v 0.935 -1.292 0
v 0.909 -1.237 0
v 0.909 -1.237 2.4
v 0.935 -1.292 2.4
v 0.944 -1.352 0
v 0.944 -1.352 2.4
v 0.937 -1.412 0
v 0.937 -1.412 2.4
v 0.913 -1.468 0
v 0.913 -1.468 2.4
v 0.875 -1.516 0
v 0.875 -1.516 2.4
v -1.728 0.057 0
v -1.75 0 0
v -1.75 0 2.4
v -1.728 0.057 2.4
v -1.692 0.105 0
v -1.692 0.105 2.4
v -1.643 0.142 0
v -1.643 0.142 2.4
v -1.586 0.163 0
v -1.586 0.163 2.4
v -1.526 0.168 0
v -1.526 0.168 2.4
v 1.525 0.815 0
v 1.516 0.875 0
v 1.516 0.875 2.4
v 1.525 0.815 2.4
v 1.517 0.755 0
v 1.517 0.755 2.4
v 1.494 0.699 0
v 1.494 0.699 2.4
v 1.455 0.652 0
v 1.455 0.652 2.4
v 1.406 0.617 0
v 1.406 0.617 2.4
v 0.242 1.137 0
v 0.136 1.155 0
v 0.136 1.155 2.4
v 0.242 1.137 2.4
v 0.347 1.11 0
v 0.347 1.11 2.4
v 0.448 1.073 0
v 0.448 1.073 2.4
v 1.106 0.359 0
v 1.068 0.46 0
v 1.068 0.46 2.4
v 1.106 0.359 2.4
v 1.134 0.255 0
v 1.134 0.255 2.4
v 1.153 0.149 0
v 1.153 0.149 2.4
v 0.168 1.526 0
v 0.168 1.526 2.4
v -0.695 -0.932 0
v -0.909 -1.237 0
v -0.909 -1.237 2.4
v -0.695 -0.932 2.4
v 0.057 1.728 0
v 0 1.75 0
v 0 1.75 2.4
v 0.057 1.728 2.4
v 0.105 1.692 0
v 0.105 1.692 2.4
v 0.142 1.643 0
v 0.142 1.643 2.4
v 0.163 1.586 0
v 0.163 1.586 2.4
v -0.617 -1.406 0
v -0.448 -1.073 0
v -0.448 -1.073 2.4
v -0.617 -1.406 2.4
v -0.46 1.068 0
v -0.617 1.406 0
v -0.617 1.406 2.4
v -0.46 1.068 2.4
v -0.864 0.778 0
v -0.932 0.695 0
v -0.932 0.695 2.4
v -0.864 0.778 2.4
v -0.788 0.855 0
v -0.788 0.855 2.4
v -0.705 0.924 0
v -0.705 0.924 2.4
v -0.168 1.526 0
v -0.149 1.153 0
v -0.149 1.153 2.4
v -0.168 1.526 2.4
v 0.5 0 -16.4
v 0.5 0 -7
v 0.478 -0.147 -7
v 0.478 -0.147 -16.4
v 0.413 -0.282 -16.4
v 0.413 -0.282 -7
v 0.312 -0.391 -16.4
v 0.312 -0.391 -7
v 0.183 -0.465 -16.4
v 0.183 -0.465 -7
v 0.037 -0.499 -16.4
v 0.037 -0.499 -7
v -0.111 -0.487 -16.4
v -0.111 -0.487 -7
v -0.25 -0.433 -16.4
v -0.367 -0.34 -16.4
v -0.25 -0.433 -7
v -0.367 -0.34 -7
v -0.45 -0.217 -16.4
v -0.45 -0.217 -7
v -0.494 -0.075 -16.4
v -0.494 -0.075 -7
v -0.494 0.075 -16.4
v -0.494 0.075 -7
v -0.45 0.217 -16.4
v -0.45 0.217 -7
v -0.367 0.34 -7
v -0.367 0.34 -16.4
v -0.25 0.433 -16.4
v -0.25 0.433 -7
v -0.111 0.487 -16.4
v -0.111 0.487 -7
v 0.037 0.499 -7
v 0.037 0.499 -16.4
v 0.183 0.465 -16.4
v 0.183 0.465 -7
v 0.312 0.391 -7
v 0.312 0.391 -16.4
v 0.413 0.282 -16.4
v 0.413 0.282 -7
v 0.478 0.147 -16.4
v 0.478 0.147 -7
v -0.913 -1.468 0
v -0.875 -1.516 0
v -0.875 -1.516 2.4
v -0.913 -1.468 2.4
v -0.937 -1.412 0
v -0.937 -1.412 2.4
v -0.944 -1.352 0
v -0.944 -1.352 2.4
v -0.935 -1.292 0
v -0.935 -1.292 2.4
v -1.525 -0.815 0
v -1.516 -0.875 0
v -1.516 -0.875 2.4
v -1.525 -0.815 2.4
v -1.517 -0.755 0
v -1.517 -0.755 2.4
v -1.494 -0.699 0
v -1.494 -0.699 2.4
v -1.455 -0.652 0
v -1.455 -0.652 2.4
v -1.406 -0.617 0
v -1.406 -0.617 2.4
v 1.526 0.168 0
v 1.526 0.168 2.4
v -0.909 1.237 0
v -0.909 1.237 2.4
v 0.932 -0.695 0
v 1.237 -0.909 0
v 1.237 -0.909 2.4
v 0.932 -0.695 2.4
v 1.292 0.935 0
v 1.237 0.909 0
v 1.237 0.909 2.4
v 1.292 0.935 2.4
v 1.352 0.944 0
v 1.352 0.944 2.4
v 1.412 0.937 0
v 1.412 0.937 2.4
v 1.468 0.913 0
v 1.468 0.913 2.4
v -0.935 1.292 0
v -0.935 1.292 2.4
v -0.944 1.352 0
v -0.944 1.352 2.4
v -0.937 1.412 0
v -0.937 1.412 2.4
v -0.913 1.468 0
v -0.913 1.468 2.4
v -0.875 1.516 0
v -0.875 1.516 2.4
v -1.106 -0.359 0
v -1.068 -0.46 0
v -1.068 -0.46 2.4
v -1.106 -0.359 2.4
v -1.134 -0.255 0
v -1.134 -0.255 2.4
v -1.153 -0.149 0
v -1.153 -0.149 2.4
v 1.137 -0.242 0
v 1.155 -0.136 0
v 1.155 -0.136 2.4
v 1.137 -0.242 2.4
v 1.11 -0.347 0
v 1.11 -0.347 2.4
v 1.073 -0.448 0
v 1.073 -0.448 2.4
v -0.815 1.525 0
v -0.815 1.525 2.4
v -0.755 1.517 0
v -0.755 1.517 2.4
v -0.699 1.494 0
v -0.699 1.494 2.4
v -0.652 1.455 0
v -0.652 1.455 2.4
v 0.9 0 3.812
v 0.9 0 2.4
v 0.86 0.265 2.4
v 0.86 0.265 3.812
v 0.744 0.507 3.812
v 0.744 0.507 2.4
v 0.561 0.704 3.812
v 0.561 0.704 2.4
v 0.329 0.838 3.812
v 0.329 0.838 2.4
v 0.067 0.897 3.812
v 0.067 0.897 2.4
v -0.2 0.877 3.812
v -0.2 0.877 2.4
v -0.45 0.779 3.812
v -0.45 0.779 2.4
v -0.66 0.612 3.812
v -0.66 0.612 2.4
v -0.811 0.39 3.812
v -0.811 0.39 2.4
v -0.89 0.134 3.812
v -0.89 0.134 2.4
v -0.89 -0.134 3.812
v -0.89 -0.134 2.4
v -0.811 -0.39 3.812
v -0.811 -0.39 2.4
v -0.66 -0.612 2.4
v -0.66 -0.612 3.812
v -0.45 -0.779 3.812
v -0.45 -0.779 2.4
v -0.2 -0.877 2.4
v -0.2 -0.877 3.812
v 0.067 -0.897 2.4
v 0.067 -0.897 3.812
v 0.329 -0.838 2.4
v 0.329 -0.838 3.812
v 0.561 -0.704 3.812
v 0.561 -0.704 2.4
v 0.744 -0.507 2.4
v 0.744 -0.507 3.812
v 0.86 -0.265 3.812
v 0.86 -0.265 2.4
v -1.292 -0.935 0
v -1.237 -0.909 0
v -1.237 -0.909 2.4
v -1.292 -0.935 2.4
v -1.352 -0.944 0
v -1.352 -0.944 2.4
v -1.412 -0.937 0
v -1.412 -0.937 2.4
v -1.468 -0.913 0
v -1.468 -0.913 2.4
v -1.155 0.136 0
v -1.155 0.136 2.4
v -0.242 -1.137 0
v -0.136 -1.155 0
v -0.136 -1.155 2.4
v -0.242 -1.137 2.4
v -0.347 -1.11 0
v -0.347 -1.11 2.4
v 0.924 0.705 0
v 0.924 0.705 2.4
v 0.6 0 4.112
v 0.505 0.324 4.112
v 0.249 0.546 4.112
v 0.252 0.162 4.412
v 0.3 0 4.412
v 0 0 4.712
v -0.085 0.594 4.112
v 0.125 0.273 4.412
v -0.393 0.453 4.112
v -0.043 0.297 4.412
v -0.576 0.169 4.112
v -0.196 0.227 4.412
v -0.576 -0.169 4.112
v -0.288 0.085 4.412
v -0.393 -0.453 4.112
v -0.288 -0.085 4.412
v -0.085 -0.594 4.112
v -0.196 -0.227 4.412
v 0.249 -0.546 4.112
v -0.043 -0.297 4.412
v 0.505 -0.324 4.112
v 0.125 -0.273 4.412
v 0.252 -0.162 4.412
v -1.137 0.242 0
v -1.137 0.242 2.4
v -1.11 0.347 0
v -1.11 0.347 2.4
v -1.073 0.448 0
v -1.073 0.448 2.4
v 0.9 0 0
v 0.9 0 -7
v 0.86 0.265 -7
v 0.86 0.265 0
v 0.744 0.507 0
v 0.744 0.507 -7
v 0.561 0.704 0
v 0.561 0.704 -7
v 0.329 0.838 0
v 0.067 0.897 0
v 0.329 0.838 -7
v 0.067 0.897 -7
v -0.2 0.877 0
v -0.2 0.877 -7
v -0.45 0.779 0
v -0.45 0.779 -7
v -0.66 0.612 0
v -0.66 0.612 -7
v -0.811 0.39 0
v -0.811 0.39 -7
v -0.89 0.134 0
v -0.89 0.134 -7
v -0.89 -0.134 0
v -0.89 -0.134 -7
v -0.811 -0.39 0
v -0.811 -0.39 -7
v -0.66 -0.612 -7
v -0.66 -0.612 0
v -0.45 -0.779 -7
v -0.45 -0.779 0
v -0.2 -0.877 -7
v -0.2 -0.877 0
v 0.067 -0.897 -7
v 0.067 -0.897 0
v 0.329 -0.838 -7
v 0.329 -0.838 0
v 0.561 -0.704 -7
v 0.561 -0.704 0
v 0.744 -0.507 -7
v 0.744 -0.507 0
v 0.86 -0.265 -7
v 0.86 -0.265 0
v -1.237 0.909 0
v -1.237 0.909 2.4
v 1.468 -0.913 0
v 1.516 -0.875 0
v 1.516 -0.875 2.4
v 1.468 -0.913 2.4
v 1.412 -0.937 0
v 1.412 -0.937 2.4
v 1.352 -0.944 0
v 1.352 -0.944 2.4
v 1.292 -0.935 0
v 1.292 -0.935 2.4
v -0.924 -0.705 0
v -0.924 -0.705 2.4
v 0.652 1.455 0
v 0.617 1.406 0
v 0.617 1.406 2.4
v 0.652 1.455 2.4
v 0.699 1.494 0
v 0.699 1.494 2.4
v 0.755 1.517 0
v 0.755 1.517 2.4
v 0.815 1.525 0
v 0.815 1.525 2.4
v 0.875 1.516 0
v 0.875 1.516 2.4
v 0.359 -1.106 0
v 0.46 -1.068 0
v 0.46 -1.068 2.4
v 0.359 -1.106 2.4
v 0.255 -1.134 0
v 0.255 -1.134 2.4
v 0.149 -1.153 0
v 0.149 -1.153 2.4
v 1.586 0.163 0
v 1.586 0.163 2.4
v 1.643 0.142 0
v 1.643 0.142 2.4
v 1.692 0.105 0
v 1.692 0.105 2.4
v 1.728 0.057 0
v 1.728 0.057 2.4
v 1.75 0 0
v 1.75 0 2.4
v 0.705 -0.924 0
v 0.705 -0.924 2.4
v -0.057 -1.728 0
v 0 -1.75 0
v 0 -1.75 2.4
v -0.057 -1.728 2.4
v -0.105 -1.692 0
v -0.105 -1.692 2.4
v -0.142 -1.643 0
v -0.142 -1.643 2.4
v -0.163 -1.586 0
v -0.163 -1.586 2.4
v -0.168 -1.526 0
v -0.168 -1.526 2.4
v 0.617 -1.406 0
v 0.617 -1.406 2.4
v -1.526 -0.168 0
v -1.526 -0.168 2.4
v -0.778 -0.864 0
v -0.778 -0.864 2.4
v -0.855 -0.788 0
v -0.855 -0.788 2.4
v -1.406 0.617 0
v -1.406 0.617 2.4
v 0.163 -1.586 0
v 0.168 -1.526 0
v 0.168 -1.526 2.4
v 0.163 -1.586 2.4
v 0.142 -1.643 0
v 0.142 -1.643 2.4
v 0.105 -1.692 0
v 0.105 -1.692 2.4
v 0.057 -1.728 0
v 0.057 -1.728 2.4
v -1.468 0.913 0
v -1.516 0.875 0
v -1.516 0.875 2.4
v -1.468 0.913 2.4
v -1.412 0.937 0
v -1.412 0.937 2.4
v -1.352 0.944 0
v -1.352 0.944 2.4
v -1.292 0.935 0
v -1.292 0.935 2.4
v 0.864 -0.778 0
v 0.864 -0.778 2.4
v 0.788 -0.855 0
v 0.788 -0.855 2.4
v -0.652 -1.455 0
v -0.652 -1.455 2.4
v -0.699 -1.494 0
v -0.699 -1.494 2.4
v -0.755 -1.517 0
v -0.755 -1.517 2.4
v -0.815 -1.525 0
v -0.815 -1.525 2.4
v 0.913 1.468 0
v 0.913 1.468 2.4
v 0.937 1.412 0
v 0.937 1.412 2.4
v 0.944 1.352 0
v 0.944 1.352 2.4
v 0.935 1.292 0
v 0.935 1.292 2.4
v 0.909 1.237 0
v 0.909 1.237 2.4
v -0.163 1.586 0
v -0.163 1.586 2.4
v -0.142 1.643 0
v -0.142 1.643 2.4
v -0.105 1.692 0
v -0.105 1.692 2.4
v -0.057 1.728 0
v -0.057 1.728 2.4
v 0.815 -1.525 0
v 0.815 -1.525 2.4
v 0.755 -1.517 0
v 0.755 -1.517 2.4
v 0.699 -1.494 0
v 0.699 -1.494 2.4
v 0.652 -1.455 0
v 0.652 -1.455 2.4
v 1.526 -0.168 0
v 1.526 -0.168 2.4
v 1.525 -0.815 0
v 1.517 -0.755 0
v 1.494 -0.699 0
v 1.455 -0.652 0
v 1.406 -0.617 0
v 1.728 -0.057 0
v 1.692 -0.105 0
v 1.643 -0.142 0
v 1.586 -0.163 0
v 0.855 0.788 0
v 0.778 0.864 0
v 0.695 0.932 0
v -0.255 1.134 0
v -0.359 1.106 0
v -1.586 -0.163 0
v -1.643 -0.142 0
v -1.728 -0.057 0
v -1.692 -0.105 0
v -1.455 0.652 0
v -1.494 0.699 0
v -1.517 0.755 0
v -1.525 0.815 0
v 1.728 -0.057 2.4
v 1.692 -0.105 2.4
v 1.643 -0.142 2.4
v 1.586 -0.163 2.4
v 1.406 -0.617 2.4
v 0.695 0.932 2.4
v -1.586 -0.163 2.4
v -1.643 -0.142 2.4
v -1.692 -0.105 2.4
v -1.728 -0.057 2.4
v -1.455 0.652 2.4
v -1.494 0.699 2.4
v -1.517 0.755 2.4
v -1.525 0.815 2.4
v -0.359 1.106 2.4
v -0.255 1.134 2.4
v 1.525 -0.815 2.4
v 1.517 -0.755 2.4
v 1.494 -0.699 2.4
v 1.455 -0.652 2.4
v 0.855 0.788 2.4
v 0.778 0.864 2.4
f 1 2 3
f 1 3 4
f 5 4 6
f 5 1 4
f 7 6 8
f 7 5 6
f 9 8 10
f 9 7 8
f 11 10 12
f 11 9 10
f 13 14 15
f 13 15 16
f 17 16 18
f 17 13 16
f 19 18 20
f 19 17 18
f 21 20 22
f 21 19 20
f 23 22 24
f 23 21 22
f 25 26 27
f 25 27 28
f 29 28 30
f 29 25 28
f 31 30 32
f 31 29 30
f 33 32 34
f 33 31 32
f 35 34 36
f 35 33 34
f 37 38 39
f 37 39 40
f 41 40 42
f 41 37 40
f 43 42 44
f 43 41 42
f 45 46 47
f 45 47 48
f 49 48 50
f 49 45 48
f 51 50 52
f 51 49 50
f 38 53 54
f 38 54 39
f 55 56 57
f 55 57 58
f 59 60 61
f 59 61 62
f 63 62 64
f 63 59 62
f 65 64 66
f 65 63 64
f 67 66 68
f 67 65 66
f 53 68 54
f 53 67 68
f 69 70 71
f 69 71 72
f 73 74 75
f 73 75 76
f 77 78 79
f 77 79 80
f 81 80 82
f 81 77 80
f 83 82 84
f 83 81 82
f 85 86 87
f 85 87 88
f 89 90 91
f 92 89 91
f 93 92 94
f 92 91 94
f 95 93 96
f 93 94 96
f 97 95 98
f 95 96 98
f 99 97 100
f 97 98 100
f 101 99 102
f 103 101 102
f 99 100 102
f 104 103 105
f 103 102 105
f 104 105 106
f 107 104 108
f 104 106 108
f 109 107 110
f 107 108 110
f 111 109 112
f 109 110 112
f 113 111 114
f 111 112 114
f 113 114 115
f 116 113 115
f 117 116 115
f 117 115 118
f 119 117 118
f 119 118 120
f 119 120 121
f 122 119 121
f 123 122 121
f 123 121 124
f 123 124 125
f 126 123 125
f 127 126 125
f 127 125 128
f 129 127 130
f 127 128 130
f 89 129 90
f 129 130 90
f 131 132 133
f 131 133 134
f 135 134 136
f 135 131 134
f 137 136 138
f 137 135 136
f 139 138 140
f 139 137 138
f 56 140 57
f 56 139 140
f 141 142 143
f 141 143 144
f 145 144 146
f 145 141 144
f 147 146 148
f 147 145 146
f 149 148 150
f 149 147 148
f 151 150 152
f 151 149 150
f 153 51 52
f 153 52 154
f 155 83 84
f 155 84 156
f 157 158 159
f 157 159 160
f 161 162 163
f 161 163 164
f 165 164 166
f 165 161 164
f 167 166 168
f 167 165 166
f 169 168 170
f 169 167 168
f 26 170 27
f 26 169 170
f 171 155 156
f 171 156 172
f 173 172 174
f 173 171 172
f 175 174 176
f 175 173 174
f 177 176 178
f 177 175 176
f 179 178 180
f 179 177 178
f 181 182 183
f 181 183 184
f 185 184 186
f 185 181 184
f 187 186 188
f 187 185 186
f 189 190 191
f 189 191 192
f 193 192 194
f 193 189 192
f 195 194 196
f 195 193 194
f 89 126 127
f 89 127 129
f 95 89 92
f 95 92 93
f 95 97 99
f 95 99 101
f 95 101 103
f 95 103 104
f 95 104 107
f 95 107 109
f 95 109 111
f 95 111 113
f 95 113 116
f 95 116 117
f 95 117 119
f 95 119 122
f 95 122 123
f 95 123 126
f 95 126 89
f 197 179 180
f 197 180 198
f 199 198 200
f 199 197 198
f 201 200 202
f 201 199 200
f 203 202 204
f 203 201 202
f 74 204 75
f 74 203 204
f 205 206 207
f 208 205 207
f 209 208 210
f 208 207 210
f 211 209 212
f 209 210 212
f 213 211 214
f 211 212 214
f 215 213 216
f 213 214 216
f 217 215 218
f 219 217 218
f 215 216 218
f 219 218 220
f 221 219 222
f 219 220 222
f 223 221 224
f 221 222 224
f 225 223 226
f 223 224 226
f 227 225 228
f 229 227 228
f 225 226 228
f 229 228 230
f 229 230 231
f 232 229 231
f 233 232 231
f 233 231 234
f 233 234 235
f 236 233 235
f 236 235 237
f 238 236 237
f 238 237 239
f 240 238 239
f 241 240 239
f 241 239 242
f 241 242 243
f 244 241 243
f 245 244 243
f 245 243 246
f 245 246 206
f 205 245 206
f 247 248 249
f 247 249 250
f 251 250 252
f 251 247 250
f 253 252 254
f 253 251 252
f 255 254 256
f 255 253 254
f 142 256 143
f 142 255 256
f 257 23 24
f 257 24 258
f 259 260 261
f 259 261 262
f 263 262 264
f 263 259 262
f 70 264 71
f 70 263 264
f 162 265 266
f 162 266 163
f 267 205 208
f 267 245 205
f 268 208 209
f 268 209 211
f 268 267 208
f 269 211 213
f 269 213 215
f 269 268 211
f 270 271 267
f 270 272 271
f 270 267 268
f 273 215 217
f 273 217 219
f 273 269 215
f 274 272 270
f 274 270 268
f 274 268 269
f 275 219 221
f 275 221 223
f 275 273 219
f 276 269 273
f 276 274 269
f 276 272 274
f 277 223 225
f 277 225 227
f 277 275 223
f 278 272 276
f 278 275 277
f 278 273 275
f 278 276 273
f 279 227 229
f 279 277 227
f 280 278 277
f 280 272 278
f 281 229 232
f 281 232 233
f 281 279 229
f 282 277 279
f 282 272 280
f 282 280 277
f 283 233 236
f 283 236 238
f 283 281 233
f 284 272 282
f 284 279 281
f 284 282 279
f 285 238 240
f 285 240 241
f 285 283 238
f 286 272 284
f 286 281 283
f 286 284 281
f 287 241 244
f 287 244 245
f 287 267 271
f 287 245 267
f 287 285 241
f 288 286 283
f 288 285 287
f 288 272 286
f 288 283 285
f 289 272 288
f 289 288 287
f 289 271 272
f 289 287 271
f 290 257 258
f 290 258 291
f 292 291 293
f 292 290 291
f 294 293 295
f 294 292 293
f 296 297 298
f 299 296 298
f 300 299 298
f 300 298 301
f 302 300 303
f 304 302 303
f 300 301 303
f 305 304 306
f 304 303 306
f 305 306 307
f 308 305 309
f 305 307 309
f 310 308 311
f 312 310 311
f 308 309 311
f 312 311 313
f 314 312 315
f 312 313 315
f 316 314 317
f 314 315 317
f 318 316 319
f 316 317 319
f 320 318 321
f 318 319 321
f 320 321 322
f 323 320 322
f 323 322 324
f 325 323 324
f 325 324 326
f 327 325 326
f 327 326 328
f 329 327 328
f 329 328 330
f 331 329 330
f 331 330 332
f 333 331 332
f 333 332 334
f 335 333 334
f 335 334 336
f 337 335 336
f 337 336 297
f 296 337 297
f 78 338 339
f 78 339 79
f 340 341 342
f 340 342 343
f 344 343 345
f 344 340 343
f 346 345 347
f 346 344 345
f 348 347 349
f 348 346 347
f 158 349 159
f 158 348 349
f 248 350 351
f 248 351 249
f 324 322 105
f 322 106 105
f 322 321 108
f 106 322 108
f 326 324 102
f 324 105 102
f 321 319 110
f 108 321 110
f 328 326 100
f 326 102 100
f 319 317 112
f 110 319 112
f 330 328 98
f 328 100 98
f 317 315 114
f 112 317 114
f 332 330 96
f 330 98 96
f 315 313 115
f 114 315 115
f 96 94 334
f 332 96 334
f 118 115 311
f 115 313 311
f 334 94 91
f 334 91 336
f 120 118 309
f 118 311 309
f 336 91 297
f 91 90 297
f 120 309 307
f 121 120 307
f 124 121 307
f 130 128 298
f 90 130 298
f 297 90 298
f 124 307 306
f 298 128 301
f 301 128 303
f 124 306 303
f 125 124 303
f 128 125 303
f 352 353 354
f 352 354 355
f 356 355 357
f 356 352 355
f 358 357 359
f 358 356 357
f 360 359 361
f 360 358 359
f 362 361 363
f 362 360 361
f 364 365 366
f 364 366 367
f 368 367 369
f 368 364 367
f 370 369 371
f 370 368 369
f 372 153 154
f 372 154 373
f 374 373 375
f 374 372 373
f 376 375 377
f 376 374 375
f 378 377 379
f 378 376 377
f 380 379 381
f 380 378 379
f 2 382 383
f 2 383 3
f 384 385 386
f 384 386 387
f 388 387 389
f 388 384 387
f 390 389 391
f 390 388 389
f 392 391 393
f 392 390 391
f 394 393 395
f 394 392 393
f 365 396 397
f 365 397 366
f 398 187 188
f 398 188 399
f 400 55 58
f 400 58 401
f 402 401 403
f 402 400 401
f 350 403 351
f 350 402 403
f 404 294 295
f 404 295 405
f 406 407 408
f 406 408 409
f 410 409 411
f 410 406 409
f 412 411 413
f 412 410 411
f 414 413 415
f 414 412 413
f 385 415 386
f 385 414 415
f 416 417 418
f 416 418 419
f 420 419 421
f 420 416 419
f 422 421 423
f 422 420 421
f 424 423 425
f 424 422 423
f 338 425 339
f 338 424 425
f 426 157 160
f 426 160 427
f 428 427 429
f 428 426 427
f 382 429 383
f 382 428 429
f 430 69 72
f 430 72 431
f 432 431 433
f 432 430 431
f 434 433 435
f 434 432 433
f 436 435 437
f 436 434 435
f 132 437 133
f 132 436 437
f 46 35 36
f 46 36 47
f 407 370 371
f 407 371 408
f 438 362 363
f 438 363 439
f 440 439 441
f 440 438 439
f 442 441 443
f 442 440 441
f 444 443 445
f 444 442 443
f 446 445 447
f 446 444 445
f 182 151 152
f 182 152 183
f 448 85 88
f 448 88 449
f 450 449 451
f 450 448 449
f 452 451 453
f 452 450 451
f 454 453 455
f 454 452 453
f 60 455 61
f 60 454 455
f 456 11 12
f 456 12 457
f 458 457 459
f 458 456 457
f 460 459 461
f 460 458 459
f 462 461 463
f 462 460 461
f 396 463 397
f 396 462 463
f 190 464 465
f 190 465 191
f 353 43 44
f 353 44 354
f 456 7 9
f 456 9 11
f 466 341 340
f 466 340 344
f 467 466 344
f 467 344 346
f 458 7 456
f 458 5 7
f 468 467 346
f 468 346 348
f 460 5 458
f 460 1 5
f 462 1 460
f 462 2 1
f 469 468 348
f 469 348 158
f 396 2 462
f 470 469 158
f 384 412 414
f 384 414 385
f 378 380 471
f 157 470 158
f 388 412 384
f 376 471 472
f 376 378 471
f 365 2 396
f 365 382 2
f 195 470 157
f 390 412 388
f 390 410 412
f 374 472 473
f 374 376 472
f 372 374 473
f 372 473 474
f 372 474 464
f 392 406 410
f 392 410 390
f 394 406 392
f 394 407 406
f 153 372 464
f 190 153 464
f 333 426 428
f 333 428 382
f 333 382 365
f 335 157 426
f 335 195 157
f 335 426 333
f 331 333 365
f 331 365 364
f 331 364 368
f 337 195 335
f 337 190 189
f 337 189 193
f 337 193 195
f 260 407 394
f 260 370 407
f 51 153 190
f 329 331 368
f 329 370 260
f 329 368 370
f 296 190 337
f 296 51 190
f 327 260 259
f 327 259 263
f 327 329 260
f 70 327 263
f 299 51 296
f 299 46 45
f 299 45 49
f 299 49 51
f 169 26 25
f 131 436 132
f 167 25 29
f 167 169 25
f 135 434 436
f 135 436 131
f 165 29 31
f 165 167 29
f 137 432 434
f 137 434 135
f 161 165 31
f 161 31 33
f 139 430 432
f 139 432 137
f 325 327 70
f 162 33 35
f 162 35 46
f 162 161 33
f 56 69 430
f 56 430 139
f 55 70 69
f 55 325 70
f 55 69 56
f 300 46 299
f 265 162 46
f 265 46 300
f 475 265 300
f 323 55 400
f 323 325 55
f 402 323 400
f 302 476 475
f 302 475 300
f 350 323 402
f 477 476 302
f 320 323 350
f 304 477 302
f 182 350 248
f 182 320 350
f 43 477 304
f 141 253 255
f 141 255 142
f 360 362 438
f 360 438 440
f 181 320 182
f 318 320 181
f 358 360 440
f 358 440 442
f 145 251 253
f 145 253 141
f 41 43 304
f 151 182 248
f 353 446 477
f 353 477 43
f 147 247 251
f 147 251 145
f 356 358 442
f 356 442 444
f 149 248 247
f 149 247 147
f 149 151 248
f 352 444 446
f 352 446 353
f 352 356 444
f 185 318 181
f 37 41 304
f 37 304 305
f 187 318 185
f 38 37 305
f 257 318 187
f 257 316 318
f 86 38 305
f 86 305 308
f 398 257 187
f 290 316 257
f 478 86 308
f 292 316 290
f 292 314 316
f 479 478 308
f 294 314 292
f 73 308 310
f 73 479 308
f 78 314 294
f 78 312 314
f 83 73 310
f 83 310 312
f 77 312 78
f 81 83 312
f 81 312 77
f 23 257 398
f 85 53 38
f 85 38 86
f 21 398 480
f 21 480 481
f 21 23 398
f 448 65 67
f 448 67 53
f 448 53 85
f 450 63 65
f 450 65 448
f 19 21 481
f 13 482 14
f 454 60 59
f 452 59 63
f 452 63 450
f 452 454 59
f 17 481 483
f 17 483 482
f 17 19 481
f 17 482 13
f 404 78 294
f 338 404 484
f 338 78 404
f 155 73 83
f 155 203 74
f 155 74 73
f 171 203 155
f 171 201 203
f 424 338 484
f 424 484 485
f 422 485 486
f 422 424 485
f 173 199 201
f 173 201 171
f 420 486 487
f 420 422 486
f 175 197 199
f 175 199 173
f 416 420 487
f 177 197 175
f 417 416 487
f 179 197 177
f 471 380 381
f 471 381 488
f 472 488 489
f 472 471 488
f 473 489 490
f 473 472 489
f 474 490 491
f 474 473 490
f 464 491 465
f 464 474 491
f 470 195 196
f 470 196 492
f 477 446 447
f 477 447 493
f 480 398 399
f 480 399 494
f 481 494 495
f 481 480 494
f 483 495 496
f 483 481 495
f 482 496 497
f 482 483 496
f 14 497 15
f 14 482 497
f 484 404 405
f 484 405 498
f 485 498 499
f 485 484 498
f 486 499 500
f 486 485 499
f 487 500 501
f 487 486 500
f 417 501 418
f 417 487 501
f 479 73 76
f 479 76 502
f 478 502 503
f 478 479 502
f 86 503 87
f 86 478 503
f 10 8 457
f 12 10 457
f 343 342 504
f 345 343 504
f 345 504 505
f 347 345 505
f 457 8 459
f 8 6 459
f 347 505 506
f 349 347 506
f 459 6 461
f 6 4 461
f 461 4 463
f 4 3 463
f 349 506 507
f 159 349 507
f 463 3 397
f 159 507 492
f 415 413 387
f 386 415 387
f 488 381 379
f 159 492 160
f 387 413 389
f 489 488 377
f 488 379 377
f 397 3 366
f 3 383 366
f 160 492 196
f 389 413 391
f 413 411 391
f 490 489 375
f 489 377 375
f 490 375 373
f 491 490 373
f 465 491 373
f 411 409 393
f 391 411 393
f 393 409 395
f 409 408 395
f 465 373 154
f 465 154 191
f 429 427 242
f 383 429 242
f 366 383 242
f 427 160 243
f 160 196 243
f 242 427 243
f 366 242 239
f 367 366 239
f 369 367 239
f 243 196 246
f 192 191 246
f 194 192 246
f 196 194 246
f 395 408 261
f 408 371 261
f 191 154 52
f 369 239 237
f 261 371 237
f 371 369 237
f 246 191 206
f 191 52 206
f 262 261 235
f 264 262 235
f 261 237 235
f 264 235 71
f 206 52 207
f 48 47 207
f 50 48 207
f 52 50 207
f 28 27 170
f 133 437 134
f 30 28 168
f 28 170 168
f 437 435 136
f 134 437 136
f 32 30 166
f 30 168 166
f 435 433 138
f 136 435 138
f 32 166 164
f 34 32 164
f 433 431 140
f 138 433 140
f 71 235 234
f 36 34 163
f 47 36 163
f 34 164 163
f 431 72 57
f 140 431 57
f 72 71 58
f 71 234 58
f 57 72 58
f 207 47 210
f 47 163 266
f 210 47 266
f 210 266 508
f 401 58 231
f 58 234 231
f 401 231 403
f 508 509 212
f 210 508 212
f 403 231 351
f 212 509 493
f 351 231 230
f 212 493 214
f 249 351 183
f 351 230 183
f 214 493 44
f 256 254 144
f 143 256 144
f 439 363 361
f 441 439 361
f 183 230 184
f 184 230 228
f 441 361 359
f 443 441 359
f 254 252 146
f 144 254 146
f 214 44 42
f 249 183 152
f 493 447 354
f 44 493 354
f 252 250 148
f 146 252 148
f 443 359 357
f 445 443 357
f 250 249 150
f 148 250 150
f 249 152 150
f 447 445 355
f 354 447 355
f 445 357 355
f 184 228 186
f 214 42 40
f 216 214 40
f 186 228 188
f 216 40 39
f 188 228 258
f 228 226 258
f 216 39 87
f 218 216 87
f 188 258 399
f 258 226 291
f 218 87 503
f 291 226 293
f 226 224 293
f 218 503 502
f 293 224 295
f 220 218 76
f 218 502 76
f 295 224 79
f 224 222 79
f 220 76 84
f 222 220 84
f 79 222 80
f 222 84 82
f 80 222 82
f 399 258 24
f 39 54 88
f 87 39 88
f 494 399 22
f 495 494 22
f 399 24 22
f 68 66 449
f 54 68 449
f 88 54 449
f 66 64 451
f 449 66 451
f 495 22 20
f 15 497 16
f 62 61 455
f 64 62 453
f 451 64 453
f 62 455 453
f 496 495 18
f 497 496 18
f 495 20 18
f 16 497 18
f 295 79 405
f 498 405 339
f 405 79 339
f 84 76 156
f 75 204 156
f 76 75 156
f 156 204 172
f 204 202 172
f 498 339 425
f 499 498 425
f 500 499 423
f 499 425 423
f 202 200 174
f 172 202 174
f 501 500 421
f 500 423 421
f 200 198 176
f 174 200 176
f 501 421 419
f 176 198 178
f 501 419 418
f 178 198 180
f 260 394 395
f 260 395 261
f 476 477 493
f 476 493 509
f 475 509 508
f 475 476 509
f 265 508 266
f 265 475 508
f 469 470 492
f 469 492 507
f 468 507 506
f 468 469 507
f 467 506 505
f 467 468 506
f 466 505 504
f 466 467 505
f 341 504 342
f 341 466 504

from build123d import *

# Parameters (mm, degrees)
SKETCH1_R                = 0.9
BOSS_EXTRUDE3_DEPTH      = 2.4
BOSS_EXTRUDE4_DEPTH      = 4.7124
BOSS_EXTRUDE4_DEPTH_BACK = 7
SKETCH1_4_R              = 0.9
SKETCH2_R                = 0.5
BOSS_EXTRUDE5_DEPTH      = 9.4
CHAMFER1_SIZE            = 0.9


with BuildPart() as part:
    # Sketch1 → Boss-Extrude3 (new body)
    with BuildSketch(Plane.XY):
        with BuildLine():
            Line((-0.168494904, 1.525812496), (-0.14853508, 1.15297163))
            ThreePointArc((-0.14853508, 1.15297163), (-0.307014366, 1.121226306), (-0.459558891, 1.067807041))
            Line((-0.459558891, 1.067807041), (-0.616985381, 1.405639835))
            ThreePointArc((-0.616985381, 1.405639835), (-0.725995936, 1.507536988), (-0.875, 1.515544457))
            ThreePointArc((-0.875, 1.515544457), (-0.942567361, 1.382499417), (-0.908827115, 1.237144931))
            Line((-0.908827115, 1.237144931), (-0.705120968, 0.924235181))
            ThreePointArc((-0.705120968, 0.924235181), (-0.826495394, 0.817503281), (-0.931893194, 0.694968578))
            Line((-0.931893194, 0.694968578), (-1.237144931, 0.908827115))
            ThreePointArc((-1.237144931, 0.908827115), (-1.382499417, 0.942567361), (-1.515544457, 0.875))
            ThreePointArc((-1.515544457, 0.875), (-1.507536988, 0.725995936), (-1.405639835, 0.616985381))
            Line((-1.405639835, 0.616985381), (-1.072770262, 0.447850662))
            ThreePointArc((-1.072770262, 0.447850662), (-1.124517647, 0.294730912), (-1.154527469, 0.135913846))
            Line((-1.154527469, 0.135913846), (-1.525812496, 0.168494904))
            ThreePointArc((-1.525812496, 0.168494904), (-1.668563296, 0.125037571), (-1.75, 0))
            ThreePointArc((-1.75, 0), (-1.668563296, -0.125037571), (-1.525812496, -0.168494904))
            Line((-1.525812496, -0.168494904), (-1.15297163, -0.14853508))
            ThreePointArc((-1.15297163, -0.14853508), (-1.121226306, -0.307014366), (-1.067807041, -0.459558891))
            Line((-1.067807041, -0.459558891), (-1.405639835, -0.616985381))
            ThreePointArc((-1.405639835, -0.616985381), (-1.507536988, -0.725995936), (-1.515544457, -0.875))
            ThreePointArc((-1.515544457, -0.875), (-1.382499417, -0.942567361), (-1.237144931, -0.908827115))
            Line((-1.237144931, -0.908827115), (-0.924235181, -0.705120968))
            ThreePointArc((-0.924235181, -0.705120968), (-0.817503281, -0.826495394), (-0.694968578, -0.931893194))
            Line((-0.694968578, -0.931893194), (-0.908827115, -1.237144931))
            ThreePointArc((-0.908827115, -1.237144931), (-0.942567361, -1.382499417), (-0.875, -1.515544457))
            ThreePointArc((-0.875, -1.515544457), (-0.725995936, -1.507536988), (-0.616985381, -1.405639835))
            Line((-0.616985381, -1.405639835), (-0.447850662, -1.072770262))
            ThreePointArc((-0.447850662, -1.072770262), (-0.294730912, -1.124517647), (-0.135913846, -1.154527469))
            Line((-0.135913846, -1.154527469), (-0.168494904, -1.525812496))
            ThreePointArc((-0.168494904, -1.525812496), (-0.125037571, -1.668563296), (0, -1.75))
            ThreePointArc((0, -1.75), (0.125037571, -1.668563296), (0.168494904, -1.525812496))
            Line((0.168494904, -1.525812496), (0.14853508, -1.15297163))
            ThreePointArc((0.14853508, -1.15297163), (0.307014366, -1.121226306), (0.459558891, -1.067807041))
            Line((0.459558891, -1.067807041), (0.616985381, -1.405639835))
            ThreePointArc((0.616985381, -1.405639835), (0.725995936, -1.507536988), (0.875, -1.515544457))
            ThreePointArc((0.875, -1.515544457), (0.942567361, -1.382499417), (0.908827115, -1.237144931))
            Line((0.908827115, -1.237144931), (0.705120968, -0.924235181))
            ThreePointArc((0.705120968, -0.924235181), (0.826495394, -0.817503281), (0.931893194, -0.694968578))
            Line((0.931893194, -0.694968578), (1.237144931, -0.908827115))
            ThreePointArc((1.237144931, -0.908827115), (1.382499417, -0.942567361), (1.515544457, -0.875))
            ThreePointArc((1.515544457, -0.875), (1.507536988, -0.725995936), (1.405639835, -0.616985381))
            Line((1.405639835, -0.616985381), (1.072770262, -0.447850662))
            ThreePointArc((1.072770262, -0.447850662), (1.124517647, -0.294730912), (1.154527469, -0.135913846))
            Line((1.154527469, -0.135913846), (1.525812496, -0.168494904))
            ThreePointArc((1.525812496, -0.168494904), (1.668563296, -0.125037571), (1.75, 0))
            ThreePointArc((1.75, 0), (1.668563296, 0.125037571), (1.525812496, 0.168494904))
            Line((1.525812496, 0.168494904), (1.15297163, 0.14853508))
            ThreePointArc((1.15297163, 0.14853508), (1.121226306, 0.307014366), (1.067807041, 0.459558891))
            Line((1.067807041, 0.459558891), (1.405639835, 0.616985381))
            ThreePointArc((1.405639835, 0.616985381), (1.507536988, 0.725995936), (1.515544457, 0.875))
            ThreePointArc((1.515544457, 0.875), (1.382499417, 0.942567361), (1.237144931, 0.908827115))
            Line((1.237144931, 0.908827115), (0.924235181, 0.705120968))
            ThreePointArc((0.924235181, 0.705120968), (0.817503281, 0.826495394), (0.694968578, 0.931893194))
            Line((0.694968578, 0.931893194), (0.908827115, 1.237144931))
            ThreePointArc((0.908827115, 1.237144931), (0.942567361, 1.382499417), (0.875, 1.515544457))
            ThreePointArc((0.875, 1.515544457), (0.725995936, 1.507536988), (0.616985381, 1.405639835))
            Line((0.616985381, 1.405639835), (0.447850662, 1.072770262))
            ThreePointArc((0.447850662, 1.072770262), (0.294730912, 1.124517647), (0.135913846, 1.154527469))
            Line((0.135913846, 1.154527469), (0.168494904, 1.525812496))
            ThreePointArc((0.168494904, 1.525812496), (0.125037571, 1.668563296), (0, 1.75))
            ThreePointArc((0, 1.75), (-0.125037571, 1.668563296), (-0.168494904, 1.525812496))
        make_face()
        Circle(SKETCH1_R, mode=Mode.SUBTRACT)
    extrude(amount=BOSS_EXTRUDE3_DEPTH)

    # Sketch1<4> → Boss-Extrude4 (add, two sides: drawn at the far end of the back side and taken through both)
    with BuildSketch(Plane.XY.offset(-BOSS_EXTRUDE4_DEPTH_BACK)):
        Circle(SKETCH1_4_R)
    extrude(amount=BOSS_EXTRUDE4_DEPTH + BOSS_EXTRUDE4_DEPTH_BACK)

    # Sketch2 → Boss-Extrude5 (add)
    with BuildSketch(Plane(origin=(0, 0, -7), x_dir=(-1, 0, 0), z_dir=(0, 0, -1))):
        Circle(SKETCH2_R)
    extrude(amount=BOSS_EXTRUDE5_DEPTH)

    # Chamfer1
    chamfer1_edges = [part.edges().sort_by_distance(p)[0] for p in [
        (-0.9, 0, 4.7124),
    ]]
    chamfer(chamfer1_edges, length=CHAMFER1_SIZE)


solid = part.part
